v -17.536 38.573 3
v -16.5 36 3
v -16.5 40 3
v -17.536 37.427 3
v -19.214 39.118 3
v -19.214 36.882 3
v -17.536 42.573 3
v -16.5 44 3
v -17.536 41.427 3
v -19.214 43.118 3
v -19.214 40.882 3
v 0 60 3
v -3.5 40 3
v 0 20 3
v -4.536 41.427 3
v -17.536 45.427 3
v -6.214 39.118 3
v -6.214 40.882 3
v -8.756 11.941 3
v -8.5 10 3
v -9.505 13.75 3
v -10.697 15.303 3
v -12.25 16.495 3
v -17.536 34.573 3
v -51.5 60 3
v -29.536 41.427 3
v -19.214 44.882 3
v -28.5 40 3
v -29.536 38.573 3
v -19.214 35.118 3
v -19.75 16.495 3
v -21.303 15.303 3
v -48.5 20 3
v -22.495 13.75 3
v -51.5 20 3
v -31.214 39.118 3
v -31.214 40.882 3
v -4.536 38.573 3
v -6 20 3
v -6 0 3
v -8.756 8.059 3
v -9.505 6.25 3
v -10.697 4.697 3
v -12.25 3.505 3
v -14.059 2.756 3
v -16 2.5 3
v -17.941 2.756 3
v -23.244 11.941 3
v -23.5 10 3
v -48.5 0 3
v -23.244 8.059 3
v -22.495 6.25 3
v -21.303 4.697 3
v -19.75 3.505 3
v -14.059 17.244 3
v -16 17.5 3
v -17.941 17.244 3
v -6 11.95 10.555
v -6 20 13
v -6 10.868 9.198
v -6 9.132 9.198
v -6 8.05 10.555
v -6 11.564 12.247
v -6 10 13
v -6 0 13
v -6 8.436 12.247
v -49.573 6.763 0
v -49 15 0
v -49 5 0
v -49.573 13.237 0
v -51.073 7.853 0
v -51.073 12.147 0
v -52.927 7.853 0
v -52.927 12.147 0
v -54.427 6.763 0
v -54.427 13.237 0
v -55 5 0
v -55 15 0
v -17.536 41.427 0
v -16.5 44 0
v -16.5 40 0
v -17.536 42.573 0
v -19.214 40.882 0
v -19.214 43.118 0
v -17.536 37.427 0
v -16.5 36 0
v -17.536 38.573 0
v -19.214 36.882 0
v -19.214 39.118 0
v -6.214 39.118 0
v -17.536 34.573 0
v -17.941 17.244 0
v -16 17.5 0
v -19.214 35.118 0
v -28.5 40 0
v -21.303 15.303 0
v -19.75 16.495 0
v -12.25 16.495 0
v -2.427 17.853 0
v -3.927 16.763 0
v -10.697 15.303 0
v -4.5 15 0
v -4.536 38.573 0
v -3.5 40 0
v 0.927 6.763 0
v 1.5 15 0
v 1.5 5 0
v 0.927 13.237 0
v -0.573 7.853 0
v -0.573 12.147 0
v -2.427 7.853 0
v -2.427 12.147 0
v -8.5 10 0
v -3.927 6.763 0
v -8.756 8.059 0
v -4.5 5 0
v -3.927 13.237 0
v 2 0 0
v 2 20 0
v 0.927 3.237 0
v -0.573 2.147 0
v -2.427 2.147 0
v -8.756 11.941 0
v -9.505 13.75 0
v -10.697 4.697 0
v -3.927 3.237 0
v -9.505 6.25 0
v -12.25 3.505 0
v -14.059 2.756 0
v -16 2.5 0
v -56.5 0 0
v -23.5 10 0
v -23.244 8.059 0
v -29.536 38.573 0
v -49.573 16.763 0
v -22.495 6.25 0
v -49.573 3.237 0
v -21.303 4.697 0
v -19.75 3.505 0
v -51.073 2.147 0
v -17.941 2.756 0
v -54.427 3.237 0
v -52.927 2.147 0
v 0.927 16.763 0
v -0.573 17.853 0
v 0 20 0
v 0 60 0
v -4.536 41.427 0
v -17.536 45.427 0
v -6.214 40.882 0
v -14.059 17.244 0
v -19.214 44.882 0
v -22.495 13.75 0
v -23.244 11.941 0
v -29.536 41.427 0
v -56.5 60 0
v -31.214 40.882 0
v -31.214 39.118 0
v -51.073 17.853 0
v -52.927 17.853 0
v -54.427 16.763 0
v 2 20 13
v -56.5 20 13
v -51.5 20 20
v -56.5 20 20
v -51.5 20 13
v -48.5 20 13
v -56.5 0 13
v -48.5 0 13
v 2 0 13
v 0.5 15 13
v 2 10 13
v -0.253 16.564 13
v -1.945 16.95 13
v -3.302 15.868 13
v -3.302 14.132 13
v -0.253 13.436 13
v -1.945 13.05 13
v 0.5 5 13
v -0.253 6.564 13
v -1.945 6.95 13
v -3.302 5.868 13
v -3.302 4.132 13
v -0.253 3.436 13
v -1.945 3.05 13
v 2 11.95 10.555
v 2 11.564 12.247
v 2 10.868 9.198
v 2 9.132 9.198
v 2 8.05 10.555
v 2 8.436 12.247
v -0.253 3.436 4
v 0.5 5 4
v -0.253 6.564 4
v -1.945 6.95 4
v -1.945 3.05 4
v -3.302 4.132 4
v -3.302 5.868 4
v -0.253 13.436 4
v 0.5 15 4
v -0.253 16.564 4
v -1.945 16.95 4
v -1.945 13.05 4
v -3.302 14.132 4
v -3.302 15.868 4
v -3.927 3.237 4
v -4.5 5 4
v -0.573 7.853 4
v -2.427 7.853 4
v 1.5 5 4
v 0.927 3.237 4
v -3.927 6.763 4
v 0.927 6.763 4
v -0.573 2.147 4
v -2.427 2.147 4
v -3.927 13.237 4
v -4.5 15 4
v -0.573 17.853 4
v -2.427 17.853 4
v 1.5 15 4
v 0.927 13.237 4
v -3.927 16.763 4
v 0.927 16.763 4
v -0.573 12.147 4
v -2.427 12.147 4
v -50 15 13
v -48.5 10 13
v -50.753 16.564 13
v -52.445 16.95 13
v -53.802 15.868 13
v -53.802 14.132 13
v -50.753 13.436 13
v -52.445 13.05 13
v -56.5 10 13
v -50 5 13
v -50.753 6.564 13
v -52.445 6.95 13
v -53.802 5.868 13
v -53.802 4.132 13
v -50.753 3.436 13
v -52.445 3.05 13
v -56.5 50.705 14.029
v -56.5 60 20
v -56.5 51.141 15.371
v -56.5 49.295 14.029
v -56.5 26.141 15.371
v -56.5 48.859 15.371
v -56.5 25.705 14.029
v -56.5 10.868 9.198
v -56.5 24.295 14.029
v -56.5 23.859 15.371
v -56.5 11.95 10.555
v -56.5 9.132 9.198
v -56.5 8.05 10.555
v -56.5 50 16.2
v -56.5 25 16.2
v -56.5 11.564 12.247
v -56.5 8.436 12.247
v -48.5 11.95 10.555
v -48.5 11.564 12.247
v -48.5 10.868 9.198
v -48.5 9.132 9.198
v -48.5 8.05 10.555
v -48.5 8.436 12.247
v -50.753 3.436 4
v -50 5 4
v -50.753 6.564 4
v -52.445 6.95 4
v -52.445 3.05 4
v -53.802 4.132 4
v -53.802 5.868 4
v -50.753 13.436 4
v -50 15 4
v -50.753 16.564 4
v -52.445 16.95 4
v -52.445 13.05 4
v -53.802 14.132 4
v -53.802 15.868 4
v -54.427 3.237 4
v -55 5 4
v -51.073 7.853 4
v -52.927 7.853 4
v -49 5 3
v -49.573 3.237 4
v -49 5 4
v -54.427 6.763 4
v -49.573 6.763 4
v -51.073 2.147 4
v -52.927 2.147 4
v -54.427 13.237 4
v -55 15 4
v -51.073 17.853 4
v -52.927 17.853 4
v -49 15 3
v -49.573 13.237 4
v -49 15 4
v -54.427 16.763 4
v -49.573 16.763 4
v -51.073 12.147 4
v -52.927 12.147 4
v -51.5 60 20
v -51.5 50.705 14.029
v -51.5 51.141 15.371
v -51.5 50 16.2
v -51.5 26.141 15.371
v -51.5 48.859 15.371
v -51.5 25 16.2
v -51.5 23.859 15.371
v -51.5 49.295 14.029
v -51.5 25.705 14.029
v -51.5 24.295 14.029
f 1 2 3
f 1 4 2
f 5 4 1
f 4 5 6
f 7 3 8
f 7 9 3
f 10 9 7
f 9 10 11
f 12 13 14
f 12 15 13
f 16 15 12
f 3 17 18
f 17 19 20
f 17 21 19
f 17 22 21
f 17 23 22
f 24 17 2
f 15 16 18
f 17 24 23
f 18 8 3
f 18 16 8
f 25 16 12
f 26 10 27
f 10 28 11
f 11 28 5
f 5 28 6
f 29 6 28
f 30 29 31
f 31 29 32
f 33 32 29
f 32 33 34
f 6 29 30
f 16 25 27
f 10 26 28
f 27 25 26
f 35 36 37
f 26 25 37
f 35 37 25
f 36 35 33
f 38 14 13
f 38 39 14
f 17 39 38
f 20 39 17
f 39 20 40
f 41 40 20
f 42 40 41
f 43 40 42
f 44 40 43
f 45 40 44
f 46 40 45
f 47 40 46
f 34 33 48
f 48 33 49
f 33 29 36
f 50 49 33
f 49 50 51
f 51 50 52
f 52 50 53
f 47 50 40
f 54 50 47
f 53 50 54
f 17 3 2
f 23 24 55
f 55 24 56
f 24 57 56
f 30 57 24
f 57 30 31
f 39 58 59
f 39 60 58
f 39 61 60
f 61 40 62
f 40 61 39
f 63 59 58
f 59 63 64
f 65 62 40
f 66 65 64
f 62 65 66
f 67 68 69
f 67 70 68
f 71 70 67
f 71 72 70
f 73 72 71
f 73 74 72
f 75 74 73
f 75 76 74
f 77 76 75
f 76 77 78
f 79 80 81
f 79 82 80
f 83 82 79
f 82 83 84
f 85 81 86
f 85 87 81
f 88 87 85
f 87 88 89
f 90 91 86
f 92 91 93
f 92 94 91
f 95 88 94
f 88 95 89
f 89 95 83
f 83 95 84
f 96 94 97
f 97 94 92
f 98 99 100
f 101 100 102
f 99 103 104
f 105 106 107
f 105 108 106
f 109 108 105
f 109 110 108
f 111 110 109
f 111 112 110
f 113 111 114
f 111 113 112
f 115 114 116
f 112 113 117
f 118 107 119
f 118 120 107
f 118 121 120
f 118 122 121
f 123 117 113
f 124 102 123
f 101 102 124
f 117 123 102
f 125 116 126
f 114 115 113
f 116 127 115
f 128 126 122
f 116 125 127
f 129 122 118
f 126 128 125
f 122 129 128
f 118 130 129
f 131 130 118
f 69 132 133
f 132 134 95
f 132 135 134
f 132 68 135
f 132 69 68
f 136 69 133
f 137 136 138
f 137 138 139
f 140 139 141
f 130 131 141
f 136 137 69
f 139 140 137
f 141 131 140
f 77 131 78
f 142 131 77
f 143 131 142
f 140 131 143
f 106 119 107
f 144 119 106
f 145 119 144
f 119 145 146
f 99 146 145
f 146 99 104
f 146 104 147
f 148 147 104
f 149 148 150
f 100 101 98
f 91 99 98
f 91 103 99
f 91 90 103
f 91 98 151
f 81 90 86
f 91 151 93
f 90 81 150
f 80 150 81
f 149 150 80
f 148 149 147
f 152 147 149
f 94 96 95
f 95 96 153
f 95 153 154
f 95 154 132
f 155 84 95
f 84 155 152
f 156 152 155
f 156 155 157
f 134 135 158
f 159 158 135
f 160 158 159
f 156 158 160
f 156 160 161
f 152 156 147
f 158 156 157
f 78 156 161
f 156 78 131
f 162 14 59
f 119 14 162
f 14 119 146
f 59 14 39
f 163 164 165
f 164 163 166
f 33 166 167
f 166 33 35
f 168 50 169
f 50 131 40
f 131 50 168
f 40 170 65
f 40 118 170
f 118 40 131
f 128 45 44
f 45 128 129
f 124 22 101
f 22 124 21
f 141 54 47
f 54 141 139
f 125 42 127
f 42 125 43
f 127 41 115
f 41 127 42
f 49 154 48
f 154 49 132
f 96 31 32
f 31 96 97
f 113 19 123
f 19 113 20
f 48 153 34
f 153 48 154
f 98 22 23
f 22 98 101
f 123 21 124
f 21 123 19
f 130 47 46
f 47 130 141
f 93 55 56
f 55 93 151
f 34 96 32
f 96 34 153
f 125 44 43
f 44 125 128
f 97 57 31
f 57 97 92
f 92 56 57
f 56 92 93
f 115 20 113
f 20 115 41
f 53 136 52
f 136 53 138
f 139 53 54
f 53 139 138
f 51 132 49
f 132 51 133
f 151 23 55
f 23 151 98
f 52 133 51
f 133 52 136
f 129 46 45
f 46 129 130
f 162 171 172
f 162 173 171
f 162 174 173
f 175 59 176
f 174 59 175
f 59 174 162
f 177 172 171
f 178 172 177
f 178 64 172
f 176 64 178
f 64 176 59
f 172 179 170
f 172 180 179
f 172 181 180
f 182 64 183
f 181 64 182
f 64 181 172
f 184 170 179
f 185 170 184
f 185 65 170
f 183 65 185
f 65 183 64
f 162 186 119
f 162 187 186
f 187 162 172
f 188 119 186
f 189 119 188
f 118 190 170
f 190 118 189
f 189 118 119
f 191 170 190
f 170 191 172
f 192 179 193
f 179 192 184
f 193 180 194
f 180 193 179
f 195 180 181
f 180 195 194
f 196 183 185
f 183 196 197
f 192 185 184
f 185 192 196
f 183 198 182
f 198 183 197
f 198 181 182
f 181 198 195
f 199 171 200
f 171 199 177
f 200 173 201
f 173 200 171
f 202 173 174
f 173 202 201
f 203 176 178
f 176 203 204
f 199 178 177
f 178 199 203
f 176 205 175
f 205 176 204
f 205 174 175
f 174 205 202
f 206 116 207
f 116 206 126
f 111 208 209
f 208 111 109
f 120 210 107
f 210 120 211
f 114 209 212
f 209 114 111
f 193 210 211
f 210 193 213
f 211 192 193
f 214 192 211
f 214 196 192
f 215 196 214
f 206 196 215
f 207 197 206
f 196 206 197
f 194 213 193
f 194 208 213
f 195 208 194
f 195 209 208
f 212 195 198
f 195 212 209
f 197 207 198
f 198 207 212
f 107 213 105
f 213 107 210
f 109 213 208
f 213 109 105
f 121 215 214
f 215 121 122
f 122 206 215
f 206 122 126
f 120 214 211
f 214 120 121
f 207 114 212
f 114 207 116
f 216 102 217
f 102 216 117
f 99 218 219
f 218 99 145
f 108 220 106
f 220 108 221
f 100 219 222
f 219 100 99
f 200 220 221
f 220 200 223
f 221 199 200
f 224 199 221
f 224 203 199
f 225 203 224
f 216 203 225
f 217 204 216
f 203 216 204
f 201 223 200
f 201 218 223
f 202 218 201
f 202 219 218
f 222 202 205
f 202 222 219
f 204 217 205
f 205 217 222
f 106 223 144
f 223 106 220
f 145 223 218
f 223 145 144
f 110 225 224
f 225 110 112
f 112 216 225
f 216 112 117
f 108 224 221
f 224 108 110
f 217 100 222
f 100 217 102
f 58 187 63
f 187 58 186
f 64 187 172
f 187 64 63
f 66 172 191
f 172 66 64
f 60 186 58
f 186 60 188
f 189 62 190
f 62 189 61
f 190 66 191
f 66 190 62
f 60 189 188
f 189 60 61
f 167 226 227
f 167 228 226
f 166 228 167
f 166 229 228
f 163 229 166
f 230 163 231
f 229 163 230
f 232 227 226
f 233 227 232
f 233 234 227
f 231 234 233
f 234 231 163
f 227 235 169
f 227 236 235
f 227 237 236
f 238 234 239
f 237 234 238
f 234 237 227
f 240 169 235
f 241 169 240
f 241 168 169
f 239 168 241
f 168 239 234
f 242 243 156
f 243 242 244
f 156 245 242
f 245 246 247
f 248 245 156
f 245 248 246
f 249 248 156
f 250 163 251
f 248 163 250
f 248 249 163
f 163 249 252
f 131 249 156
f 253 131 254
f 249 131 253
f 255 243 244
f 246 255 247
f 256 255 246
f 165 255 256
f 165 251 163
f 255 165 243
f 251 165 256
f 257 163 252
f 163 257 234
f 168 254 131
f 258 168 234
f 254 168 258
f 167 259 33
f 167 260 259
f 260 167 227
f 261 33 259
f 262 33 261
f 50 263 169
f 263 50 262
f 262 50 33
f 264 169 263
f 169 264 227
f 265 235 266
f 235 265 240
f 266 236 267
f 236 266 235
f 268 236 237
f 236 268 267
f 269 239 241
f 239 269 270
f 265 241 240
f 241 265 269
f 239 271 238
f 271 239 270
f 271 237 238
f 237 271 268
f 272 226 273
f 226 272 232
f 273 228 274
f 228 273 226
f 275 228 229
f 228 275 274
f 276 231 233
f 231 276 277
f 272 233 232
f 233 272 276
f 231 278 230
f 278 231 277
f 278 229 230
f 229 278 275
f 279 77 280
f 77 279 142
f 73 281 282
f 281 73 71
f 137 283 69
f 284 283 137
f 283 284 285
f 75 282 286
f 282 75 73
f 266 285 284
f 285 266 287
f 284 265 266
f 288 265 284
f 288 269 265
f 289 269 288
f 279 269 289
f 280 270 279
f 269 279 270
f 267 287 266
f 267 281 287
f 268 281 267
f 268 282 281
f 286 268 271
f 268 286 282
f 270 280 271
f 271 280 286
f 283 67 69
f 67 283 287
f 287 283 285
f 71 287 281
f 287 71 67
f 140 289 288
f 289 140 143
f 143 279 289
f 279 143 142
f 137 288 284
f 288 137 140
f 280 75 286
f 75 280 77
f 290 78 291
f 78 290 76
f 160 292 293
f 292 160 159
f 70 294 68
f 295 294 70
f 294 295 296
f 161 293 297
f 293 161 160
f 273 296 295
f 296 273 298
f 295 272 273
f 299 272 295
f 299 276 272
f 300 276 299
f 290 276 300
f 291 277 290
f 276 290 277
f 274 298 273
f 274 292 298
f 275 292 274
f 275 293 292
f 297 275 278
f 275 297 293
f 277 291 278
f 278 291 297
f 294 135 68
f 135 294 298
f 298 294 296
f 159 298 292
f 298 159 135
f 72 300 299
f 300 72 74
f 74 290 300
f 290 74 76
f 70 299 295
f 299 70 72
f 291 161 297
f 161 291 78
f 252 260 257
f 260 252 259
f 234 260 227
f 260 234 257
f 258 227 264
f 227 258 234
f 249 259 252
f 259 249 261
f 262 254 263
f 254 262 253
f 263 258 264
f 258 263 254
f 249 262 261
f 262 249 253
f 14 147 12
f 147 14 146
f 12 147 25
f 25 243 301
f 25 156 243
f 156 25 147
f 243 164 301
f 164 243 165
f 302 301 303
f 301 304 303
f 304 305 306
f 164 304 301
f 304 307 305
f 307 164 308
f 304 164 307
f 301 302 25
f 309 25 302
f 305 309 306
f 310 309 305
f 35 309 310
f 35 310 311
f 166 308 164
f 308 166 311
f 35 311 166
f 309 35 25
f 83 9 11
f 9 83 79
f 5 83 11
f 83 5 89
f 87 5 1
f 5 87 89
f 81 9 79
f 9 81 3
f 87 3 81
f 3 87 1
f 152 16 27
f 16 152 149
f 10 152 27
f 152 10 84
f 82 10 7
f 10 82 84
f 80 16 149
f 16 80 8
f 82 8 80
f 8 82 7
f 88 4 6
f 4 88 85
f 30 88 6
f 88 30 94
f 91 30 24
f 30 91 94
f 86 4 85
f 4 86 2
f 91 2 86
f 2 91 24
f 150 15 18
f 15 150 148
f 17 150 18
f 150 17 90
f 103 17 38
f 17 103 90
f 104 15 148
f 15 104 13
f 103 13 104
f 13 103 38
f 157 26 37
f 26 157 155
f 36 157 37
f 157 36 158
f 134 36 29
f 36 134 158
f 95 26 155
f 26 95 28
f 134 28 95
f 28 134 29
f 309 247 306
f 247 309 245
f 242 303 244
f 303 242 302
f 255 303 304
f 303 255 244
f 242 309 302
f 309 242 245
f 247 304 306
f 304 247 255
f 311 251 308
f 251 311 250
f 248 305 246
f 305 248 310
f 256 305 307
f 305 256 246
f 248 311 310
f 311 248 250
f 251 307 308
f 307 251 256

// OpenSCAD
 //rotate([0,-90,0]) 
module drawServoBracket() {
rotate([0,-90,0]) 
 difference() {
  union(){
    difference() {
        translate([0,0,-2])bracket();
          union() {
              //Upper mounting point
             rotate([0,90,0]) translate([-65,6,-5]) cylinder(20,d=4);
             rotate([0,90,0]) translate([-61,10,-5]) cylinder(20,d=4);
             rotate([0,90,0]) translate([-65,14,-5]) cylinder(20,d=4);
             
          }
    }


    translate([0,20,0]) cube([3,40,56]);
    translate([0,20,51.5]) cube([20,40,5]);


  }
  rotate([0,90,0]) translate([-18,40,0]) cylinder(20,d=3);
  rotate([0,90,0]) translate([-18,44,0]) cylinder(20,d=3);
  rotate([0,90,0]) translate([-18,36,0]) cylinder(20,d=3);
  rotate([0,90,0]) translate([-5,40,0]) cylinder(20,d=3);
  rotate([0,90,0]) translate([-30,40,0]) cylinder(20,d=3);
  translate([15,50,40]) cylinder(20,d=2.4);
  translate([15,25,40]) cylinder(20,d=2.4);
//  translate([-18,0,0]) cylinder(20,d=2);
//  //Mounting Point
//  rotate([0,90,0]) translate([12,26,0]) cylinder(20,d=4);
//  rotate([0,90,0]) translate([8,30,0]) cylinder(20,d=4);
//  color([1,0,0])rotate([0,90,0]) translate([12,34,-5]) cylinder(20,d=4);
 }
}
module bracket() {
        difference() {
        union() {
            translate([0,0,8])cube([3,20,43]);
            //translate([0,0,57])cube([3,20,33]);
        }
        translate([-1,10,18]) rotate([0,90,0]) cylinder(5,d1=15,d2=15); 
    }
    header();
    translate([0,0,50.5])header();
}   

module header() {
    difference() {
        cube([13,20,8]);
    
        translate([-5,5,3.5]) rotate([0,90,0]) cylinder(20,d1=4,d2=4, true);
        translate([-5,15,3.5]) rotate([0,90,0]) cylinder(20,d1=4,d2=4, true);
        translate([-5,5,3.5]) rotate([0,90,0]) cylinder(9,d1=6,d2=6, true);
        translate([-5,15,3.5]) rotate([0,90,0]) cylinder(9,d1=6,d2=6, true);
        translate([11,10,-1])cylinder(10,d=4);
    }  
    
    
}
drawServoBracket();
